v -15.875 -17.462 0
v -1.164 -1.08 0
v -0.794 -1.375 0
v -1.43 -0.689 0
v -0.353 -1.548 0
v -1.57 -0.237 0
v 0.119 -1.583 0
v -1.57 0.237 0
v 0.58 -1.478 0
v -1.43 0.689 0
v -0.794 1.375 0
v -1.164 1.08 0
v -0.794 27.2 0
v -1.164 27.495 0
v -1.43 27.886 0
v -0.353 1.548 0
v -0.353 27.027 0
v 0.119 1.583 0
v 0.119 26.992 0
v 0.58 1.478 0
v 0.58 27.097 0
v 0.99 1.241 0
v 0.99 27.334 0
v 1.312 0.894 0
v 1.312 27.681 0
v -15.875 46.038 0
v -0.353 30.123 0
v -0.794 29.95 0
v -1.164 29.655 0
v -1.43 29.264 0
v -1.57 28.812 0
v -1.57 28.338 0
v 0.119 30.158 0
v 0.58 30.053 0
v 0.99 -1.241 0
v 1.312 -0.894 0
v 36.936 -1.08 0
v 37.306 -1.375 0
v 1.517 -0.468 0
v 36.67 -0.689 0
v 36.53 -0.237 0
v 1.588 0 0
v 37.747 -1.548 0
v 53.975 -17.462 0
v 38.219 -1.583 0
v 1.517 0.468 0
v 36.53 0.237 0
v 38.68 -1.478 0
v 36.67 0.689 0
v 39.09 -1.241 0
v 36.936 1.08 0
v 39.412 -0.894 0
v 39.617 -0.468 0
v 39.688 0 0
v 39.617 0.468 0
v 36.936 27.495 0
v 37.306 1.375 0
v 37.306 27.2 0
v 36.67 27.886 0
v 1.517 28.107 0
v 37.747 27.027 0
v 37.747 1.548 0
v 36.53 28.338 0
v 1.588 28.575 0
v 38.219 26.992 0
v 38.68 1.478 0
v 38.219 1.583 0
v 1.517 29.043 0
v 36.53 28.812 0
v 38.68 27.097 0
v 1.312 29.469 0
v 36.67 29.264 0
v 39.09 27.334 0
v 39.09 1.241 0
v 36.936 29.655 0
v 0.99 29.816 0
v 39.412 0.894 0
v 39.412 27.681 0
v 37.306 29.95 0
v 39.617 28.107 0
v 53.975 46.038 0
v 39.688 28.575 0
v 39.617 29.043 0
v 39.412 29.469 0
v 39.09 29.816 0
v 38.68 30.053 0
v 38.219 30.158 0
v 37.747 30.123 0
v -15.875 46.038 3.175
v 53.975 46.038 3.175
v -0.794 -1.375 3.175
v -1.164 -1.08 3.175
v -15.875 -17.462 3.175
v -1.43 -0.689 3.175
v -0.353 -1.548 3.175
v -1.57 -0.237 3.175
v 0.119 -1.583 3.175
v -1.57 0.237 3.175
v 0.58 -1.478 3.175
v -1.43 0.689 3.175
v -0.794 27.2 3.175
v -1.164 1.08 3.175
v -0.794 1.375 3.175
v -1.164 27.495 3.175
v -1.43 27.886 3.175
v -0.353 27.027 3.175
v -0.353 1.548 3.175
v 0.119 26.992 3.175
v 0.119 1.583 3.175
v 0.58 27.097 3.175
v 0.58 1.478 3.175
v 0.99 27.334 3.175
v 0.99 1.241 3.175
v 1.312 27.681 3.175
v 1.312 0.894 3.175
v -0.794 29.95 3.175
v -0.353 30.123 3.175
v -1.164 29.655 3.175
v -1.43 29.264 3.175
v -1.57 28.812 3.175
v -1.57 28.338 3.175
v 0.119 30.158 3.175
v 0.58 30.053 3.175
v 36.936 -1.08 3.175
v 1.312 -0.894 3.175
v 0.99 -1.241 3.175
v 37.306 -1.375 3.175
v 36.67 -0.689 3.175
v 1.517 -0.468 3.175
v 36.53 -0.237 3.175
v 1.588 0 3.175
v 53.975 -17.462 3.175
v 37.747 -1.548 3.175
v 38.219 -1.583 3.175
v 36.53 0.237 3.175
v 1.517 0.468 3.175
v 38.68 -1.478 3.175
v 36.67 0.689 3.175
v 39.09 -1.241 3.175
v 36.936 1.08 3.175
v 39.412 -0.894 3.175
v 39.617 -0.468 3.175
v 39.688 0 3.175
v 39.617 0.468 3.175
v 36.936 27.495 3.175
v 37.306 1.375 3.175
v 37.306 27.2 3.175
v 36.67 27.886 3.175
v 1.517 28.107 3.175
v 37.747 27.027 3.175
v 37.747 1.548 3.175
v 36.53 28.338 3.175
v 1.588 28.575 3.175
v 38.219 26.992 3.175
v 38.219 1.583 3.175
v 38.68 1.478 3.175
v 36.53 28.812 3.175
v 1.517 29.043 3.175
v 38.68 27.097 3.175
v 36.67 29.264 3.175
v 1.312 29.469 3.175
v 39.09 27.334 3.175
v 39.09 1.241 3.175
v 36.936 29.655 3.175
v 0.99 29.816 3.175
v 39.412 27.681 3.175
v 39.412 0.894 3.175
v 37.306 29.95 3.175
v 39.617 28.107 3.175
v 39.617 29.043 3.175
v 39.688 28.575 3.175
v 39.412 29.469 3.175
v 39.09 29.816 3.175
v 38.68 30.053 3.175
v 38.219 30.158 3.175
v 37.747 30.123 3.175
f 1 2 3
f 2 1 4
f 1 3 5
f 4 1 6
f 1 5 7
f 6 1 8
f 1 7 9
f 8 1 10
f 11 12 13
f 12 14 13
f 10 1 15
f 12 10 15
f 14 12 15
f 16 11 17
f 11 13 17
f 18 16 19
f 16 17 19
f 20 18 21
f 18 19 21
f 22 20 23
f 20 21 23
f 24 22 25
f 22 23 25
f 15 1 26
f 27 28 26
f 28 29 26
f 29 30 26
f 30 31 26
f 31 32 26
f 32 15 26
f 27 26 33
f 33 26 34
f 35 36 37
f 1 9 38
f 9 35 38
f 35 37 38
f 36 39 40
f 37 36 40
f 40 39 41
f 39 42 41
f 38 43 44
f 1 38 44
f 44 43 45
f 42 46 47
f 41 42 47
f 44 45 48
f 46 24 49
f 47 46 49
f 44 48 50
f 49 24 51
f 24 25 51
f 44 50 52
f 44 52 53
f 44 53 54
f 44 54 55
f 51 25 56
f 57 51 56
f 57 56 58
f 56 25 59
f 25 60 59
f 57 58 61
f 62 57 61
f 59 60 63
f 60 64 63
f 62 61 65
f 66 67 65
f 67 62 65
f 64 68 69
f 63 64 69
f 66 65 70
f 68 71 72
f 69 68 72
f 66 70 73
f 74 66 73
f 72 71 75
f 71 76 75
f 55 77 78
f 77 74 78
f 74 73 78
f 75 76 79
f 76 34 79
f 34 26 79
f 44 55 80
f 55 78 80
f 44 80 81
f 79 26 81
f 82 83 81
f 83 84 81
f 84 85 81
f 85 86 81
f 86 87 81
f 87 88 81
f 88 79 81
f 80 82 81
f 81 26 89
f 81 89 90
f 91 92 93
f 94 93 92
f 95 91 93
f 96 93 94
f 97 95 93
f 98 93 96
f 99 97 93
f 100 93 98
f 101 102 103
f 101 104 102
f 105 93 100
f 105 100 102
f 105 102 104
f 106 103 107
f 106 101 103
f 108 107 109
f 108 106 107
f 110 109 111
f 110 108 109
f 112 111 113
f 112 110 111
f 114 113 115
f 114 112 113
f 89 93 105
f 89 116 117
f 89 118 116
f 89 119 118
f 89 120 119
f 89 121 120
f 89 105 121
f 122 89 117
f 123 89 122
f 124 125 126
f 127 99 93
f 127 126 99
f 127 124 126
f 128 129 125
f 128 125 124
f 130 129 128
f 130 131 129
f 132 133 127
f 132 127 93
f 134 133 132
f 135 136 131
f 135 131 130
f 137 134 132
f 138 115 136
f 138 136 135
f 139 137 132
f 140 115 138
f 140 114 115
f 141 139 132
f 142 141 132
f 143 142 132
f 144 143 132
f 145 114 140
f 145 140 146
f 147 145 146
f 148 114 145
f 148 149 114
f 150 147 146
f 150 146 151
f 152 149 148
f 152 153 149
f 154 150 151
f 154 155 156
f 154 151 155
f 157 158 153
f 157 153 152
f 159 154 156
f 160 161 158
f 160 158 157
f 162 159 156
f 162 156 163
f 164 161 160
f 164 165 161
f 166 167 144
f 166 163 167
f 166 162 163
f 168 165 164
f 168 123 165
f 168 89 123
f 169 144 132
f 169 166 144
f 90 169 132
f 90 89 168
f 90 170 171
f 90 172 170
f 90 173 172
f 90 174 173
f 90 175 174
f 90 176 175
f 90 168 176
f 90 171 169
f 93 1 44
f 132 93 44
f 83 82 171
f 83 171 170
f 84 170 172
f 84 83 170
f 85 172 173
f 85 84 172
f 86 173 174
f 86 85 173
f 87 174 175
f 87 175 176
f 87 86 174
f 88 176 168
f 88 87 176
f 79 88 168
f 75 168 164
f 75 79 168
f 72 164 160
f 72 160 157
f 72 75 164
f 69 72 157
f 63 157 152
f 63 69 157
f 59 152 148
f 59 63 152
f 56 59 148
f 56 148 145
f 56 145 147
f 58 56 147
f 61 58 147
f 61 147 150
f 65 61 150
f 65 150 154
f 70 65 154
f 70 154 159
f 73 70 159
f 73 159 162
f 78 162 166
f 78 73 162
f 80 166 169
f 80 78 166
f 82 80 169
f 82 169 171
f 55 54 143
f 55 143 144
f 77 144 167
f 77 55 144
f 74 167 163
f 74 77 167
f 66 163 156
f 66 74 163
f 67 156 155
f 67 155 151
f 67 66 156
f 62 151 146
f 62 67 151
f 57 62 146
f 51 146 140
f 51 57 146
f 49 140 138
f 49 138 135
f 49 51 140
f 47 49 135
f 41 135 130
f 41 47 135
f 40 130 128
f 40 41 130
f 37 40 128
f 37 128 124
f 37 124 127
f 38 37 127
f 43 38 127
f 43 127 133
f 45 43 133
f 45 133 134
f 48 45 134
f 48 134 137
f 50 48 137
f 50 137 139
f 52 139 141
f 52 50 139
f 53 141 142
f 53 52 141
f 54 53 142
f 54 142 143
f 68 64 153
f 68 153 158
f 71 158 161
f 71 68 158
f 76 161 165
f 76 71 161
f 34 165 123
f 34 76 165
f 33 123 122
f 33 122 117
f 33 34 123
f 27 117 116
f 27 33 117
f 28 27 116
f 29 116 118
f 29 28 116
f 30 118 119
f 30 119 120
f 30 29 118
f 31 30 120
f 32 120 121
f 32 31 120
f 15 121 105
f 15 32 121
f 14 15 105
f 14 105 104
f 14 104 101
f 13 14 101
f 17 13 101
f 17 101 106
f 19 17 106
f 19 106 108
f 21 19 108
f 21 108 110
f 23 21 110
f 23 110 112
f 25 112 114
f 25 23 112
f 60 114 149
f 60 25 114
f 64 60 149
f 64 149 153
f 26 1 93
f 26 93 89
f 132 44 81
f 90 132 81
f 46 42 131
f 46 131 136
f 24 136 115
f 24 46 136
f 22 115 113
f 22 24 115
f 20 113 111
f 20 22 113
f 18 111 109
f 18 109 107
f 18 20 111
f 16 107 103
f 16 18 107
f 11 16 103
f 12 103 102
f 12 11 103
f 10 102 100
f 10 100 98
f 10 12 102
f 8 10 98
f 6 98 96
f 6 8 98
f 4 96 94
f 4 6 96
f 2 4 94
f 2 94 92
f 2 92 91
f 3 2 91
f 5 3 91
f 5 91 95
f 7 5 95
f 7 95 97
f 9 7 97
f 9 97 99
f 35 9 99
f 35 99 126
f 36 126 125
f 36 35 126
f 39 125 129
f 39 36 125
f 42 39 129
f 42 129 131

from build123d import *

# Parameters (mm, degrees)
SKETCH1_W           = 69.85
SKETCH1_H           = 63.5
SKETCH1_R           = 1.5875
BOSS_EXTRUDE1_DEPTH = 3.175


with BuildPart() as part:
    # Sketch1 → Boss-Extrude1 (new body)
    with BuildSketch(Plane.XY):
        with Locations((19.05, 14.2875)):
            Rectangle(SKETCH1_W, SKETCH1_H)
        with Locations((0, 28.575)):
            Circle(SKETCH1_R, mode=Mode.SUBTRACT)
        with Locations((38.1, 28.575)):
            Circle(SKETCH1_R, mode=Mode.SUBTRACT)
        with Locations((38.1, 0)):
            Circle(SKETCH1_R, mode=Mode.SUBTRACT)
        Circle(SKETCH1_R, mode=Mode.SUBTRACT)
    extrude(amount=BOSS_EXTRUDE1_DEPTH)


solid = part.part
